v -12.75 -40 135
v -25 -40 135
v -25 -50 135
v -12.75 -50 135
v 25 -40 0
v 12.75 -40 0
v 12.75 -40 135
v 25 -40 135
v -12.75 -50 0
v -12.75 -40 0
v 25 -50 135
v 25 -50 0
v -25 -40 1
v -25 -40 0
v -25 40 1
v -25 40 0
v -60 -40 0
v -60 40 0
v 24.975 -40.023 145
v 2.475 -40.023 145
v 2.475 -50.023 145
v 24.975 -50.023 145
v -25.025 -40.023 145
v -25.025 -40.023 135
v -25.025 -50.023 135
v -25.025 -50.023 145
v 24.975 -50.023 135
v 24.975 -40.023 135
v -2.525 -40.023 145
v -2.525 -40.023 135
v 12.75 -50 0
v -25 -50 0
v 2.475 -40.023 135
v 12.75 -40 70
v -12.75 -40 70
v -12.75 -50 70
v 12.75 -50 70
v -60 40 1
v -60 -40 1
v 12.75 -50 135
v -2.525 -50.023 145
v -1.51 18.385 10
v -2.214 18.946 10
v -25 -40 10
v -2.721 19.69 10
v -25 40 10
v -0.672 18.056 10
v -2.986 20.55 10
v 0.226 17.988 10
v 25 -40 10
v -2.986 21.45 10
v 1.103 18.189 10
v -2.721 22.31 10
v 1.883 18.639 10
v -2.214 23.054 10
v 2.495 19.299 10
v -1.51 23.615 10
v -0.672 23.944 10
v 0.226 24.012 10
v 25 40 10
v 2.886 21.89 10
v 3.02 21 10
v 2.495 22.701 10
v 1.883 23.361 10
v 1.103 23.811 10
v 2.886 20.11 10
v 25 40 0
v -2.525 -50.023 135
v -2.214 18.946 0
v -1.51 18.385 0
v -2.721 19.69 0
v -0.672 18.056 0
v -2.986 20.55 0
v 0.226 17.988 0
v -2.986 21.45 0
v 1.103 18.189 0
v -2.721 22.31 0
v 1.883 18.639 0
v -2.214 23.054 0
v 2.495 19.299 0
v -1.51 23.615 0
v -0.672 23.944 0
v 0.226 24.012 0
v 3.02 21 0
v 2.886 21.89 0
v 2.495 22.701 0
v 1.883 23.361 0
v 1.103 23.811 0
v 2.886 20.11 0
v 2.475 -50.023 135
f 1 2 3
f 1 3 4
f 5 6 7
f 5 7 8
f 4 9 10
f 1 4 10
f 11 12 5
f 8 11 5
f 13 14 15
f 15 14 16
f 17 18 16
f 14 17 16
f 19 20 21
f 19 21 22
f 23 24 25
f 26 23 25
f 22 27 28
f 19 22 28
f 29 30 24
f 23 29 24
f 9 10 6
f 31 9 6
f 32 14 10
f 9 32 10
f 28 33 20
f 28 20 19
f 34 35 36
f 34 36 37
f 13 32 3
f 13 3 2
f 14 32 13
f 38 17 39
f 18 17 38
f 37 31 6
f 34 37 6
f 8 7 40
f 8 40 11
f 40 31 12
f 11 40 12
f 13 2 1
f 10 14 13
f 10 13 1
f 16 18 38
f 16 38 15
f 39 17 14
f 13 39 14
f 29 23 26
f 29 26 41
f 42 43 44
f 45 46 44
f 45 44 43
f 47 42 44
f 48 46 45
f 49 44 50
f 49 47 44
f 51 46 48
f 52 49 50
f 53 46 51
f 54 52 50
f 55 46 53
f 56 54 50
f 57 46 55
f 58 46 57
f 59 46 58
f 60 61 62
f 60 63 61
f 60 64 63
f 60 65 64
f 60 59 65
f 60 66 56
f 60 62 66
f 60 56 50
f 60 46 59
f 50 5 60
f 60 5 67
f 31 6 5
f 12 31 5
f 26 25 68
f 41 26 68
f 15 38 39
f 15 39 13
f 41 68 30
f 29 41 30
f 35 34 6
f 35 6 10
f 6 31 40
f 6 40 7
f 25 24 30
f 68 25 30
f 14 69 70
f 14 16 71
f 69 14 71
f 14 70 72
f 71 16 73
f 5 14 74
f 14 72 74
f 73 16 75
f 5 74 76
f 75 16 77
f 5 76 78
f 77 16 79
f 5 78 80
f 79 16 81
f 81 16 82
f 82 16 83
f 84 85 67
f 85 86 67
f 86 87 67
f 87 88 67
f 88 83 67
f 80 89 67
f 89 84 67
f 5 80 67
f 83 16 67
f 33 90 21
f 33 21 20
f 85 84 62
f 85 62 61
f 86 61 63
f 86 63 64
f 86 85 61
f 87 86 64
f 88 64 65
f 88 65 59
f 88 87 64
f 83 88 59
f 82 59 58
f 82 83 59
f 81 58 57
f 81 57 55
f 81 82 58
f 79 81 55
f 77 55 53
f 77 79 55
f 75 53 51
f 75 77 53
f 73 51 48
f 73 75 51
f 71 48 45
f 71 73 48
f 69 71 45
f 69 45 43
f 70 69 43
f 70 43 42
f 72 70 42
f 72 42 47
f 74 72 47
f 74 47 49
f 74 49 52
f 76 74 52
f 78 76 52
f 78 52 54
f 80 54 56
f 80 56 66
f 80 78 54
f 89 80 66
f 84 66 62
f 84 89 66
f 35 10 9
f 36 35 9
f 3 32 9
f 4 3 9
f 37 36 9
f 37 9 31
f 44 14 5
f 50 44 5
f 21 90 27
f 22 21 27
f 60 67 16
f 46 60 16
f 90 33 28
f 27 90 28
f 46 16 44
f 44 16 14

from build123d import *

# Parameters (mm, degrees)
F0_W     = 35
F0_H     = 80
F1_DEPTH = 1
F0_W_2   = 12.25
F0_H_2   = 10
F2_DEPTH = 135
F5_DEPTH = 10
F4_W     = 22.5
F4_H     = 10
F6_DEPTH = 70
F0_R     = 3.02
F7_DEPTH = 10


with BuildPart() as f1:
    # F0 (on Top) → F1 (new body)
    with BuildSketch(Plane.XY):
        with Locations((-42.5, 0)):
            Rectangle(F0_W, F0_H)
    extrude(amount=F1_DEPTH)

    # F0 (on Top) → F2 (join)
    with BuildSketch(Plane.XY):
        with Locations((-18.875, -45)):
            Rectangle(F0_W_2, F0_H_2)
    extrude(amount=F2_DEPTH)


with BuildPart() as f2:
    # F0 (on Top) → F2, piece 2 (new body)
    with BuildSketch(Plane.XY):
        with Locations((18.875, -45)):
            Rectangle(F0_W_2, F0_H_2)
    extrude(amount=F2_DEPTH)


with BuildPart() as f5:
    # F4 (on offset) → F5 (new body)
    with BuildSketch(Plane.XY.offset(135)):
        Polygon((-2.525261566, -40.0230214), (-25.025261566, -40.0230214), (-25.025261566, -50.0230214), (-12.775261566, -50.0230214), (-2.525261566, -50.0230214), align=None)
    extrude(amount=F5_DEPTH)


with BuildPart() as f5b:
    # F4 (on offset) → F5, piece 2 (new body)
    with BuildSketch(Plane.XY.offset(135)):
        with Locations((13.724738434, -45.0230214)):
            Rectangle(F4_W, F4_H)
    extrude(amount=F5_DEPTH)


with BuildPart() as f6:
    # F0 (on Top) → F6 (new body)
    with BuildSketch(Plane.XY):
        Polygon((12.75, -40), (0, -40), (-12.75, -40), (-12.75, -50), (0, -50), (12.75, -50), align=None)
    extrude(amount=F6_DEPTH)


with BuildPart() as f7:
    # F0 (on Top) → F7 (new body)
    with BuildSketch(Plane.XY):
        Polygon((-12.75, -40), (0, -40), (12.75, -40), (25, -40), (25, 40), (-25, 40), (-25, -40), align=None)
        with Locations((0, 21)):
            Circle(F0_R, mode=Mode.SUBTRACT)
    extrude(amount=F7_DEPTH)


solid = Compound([f1.part, f2.part, f5.part, f5b.part, f6.part, f7.part])
